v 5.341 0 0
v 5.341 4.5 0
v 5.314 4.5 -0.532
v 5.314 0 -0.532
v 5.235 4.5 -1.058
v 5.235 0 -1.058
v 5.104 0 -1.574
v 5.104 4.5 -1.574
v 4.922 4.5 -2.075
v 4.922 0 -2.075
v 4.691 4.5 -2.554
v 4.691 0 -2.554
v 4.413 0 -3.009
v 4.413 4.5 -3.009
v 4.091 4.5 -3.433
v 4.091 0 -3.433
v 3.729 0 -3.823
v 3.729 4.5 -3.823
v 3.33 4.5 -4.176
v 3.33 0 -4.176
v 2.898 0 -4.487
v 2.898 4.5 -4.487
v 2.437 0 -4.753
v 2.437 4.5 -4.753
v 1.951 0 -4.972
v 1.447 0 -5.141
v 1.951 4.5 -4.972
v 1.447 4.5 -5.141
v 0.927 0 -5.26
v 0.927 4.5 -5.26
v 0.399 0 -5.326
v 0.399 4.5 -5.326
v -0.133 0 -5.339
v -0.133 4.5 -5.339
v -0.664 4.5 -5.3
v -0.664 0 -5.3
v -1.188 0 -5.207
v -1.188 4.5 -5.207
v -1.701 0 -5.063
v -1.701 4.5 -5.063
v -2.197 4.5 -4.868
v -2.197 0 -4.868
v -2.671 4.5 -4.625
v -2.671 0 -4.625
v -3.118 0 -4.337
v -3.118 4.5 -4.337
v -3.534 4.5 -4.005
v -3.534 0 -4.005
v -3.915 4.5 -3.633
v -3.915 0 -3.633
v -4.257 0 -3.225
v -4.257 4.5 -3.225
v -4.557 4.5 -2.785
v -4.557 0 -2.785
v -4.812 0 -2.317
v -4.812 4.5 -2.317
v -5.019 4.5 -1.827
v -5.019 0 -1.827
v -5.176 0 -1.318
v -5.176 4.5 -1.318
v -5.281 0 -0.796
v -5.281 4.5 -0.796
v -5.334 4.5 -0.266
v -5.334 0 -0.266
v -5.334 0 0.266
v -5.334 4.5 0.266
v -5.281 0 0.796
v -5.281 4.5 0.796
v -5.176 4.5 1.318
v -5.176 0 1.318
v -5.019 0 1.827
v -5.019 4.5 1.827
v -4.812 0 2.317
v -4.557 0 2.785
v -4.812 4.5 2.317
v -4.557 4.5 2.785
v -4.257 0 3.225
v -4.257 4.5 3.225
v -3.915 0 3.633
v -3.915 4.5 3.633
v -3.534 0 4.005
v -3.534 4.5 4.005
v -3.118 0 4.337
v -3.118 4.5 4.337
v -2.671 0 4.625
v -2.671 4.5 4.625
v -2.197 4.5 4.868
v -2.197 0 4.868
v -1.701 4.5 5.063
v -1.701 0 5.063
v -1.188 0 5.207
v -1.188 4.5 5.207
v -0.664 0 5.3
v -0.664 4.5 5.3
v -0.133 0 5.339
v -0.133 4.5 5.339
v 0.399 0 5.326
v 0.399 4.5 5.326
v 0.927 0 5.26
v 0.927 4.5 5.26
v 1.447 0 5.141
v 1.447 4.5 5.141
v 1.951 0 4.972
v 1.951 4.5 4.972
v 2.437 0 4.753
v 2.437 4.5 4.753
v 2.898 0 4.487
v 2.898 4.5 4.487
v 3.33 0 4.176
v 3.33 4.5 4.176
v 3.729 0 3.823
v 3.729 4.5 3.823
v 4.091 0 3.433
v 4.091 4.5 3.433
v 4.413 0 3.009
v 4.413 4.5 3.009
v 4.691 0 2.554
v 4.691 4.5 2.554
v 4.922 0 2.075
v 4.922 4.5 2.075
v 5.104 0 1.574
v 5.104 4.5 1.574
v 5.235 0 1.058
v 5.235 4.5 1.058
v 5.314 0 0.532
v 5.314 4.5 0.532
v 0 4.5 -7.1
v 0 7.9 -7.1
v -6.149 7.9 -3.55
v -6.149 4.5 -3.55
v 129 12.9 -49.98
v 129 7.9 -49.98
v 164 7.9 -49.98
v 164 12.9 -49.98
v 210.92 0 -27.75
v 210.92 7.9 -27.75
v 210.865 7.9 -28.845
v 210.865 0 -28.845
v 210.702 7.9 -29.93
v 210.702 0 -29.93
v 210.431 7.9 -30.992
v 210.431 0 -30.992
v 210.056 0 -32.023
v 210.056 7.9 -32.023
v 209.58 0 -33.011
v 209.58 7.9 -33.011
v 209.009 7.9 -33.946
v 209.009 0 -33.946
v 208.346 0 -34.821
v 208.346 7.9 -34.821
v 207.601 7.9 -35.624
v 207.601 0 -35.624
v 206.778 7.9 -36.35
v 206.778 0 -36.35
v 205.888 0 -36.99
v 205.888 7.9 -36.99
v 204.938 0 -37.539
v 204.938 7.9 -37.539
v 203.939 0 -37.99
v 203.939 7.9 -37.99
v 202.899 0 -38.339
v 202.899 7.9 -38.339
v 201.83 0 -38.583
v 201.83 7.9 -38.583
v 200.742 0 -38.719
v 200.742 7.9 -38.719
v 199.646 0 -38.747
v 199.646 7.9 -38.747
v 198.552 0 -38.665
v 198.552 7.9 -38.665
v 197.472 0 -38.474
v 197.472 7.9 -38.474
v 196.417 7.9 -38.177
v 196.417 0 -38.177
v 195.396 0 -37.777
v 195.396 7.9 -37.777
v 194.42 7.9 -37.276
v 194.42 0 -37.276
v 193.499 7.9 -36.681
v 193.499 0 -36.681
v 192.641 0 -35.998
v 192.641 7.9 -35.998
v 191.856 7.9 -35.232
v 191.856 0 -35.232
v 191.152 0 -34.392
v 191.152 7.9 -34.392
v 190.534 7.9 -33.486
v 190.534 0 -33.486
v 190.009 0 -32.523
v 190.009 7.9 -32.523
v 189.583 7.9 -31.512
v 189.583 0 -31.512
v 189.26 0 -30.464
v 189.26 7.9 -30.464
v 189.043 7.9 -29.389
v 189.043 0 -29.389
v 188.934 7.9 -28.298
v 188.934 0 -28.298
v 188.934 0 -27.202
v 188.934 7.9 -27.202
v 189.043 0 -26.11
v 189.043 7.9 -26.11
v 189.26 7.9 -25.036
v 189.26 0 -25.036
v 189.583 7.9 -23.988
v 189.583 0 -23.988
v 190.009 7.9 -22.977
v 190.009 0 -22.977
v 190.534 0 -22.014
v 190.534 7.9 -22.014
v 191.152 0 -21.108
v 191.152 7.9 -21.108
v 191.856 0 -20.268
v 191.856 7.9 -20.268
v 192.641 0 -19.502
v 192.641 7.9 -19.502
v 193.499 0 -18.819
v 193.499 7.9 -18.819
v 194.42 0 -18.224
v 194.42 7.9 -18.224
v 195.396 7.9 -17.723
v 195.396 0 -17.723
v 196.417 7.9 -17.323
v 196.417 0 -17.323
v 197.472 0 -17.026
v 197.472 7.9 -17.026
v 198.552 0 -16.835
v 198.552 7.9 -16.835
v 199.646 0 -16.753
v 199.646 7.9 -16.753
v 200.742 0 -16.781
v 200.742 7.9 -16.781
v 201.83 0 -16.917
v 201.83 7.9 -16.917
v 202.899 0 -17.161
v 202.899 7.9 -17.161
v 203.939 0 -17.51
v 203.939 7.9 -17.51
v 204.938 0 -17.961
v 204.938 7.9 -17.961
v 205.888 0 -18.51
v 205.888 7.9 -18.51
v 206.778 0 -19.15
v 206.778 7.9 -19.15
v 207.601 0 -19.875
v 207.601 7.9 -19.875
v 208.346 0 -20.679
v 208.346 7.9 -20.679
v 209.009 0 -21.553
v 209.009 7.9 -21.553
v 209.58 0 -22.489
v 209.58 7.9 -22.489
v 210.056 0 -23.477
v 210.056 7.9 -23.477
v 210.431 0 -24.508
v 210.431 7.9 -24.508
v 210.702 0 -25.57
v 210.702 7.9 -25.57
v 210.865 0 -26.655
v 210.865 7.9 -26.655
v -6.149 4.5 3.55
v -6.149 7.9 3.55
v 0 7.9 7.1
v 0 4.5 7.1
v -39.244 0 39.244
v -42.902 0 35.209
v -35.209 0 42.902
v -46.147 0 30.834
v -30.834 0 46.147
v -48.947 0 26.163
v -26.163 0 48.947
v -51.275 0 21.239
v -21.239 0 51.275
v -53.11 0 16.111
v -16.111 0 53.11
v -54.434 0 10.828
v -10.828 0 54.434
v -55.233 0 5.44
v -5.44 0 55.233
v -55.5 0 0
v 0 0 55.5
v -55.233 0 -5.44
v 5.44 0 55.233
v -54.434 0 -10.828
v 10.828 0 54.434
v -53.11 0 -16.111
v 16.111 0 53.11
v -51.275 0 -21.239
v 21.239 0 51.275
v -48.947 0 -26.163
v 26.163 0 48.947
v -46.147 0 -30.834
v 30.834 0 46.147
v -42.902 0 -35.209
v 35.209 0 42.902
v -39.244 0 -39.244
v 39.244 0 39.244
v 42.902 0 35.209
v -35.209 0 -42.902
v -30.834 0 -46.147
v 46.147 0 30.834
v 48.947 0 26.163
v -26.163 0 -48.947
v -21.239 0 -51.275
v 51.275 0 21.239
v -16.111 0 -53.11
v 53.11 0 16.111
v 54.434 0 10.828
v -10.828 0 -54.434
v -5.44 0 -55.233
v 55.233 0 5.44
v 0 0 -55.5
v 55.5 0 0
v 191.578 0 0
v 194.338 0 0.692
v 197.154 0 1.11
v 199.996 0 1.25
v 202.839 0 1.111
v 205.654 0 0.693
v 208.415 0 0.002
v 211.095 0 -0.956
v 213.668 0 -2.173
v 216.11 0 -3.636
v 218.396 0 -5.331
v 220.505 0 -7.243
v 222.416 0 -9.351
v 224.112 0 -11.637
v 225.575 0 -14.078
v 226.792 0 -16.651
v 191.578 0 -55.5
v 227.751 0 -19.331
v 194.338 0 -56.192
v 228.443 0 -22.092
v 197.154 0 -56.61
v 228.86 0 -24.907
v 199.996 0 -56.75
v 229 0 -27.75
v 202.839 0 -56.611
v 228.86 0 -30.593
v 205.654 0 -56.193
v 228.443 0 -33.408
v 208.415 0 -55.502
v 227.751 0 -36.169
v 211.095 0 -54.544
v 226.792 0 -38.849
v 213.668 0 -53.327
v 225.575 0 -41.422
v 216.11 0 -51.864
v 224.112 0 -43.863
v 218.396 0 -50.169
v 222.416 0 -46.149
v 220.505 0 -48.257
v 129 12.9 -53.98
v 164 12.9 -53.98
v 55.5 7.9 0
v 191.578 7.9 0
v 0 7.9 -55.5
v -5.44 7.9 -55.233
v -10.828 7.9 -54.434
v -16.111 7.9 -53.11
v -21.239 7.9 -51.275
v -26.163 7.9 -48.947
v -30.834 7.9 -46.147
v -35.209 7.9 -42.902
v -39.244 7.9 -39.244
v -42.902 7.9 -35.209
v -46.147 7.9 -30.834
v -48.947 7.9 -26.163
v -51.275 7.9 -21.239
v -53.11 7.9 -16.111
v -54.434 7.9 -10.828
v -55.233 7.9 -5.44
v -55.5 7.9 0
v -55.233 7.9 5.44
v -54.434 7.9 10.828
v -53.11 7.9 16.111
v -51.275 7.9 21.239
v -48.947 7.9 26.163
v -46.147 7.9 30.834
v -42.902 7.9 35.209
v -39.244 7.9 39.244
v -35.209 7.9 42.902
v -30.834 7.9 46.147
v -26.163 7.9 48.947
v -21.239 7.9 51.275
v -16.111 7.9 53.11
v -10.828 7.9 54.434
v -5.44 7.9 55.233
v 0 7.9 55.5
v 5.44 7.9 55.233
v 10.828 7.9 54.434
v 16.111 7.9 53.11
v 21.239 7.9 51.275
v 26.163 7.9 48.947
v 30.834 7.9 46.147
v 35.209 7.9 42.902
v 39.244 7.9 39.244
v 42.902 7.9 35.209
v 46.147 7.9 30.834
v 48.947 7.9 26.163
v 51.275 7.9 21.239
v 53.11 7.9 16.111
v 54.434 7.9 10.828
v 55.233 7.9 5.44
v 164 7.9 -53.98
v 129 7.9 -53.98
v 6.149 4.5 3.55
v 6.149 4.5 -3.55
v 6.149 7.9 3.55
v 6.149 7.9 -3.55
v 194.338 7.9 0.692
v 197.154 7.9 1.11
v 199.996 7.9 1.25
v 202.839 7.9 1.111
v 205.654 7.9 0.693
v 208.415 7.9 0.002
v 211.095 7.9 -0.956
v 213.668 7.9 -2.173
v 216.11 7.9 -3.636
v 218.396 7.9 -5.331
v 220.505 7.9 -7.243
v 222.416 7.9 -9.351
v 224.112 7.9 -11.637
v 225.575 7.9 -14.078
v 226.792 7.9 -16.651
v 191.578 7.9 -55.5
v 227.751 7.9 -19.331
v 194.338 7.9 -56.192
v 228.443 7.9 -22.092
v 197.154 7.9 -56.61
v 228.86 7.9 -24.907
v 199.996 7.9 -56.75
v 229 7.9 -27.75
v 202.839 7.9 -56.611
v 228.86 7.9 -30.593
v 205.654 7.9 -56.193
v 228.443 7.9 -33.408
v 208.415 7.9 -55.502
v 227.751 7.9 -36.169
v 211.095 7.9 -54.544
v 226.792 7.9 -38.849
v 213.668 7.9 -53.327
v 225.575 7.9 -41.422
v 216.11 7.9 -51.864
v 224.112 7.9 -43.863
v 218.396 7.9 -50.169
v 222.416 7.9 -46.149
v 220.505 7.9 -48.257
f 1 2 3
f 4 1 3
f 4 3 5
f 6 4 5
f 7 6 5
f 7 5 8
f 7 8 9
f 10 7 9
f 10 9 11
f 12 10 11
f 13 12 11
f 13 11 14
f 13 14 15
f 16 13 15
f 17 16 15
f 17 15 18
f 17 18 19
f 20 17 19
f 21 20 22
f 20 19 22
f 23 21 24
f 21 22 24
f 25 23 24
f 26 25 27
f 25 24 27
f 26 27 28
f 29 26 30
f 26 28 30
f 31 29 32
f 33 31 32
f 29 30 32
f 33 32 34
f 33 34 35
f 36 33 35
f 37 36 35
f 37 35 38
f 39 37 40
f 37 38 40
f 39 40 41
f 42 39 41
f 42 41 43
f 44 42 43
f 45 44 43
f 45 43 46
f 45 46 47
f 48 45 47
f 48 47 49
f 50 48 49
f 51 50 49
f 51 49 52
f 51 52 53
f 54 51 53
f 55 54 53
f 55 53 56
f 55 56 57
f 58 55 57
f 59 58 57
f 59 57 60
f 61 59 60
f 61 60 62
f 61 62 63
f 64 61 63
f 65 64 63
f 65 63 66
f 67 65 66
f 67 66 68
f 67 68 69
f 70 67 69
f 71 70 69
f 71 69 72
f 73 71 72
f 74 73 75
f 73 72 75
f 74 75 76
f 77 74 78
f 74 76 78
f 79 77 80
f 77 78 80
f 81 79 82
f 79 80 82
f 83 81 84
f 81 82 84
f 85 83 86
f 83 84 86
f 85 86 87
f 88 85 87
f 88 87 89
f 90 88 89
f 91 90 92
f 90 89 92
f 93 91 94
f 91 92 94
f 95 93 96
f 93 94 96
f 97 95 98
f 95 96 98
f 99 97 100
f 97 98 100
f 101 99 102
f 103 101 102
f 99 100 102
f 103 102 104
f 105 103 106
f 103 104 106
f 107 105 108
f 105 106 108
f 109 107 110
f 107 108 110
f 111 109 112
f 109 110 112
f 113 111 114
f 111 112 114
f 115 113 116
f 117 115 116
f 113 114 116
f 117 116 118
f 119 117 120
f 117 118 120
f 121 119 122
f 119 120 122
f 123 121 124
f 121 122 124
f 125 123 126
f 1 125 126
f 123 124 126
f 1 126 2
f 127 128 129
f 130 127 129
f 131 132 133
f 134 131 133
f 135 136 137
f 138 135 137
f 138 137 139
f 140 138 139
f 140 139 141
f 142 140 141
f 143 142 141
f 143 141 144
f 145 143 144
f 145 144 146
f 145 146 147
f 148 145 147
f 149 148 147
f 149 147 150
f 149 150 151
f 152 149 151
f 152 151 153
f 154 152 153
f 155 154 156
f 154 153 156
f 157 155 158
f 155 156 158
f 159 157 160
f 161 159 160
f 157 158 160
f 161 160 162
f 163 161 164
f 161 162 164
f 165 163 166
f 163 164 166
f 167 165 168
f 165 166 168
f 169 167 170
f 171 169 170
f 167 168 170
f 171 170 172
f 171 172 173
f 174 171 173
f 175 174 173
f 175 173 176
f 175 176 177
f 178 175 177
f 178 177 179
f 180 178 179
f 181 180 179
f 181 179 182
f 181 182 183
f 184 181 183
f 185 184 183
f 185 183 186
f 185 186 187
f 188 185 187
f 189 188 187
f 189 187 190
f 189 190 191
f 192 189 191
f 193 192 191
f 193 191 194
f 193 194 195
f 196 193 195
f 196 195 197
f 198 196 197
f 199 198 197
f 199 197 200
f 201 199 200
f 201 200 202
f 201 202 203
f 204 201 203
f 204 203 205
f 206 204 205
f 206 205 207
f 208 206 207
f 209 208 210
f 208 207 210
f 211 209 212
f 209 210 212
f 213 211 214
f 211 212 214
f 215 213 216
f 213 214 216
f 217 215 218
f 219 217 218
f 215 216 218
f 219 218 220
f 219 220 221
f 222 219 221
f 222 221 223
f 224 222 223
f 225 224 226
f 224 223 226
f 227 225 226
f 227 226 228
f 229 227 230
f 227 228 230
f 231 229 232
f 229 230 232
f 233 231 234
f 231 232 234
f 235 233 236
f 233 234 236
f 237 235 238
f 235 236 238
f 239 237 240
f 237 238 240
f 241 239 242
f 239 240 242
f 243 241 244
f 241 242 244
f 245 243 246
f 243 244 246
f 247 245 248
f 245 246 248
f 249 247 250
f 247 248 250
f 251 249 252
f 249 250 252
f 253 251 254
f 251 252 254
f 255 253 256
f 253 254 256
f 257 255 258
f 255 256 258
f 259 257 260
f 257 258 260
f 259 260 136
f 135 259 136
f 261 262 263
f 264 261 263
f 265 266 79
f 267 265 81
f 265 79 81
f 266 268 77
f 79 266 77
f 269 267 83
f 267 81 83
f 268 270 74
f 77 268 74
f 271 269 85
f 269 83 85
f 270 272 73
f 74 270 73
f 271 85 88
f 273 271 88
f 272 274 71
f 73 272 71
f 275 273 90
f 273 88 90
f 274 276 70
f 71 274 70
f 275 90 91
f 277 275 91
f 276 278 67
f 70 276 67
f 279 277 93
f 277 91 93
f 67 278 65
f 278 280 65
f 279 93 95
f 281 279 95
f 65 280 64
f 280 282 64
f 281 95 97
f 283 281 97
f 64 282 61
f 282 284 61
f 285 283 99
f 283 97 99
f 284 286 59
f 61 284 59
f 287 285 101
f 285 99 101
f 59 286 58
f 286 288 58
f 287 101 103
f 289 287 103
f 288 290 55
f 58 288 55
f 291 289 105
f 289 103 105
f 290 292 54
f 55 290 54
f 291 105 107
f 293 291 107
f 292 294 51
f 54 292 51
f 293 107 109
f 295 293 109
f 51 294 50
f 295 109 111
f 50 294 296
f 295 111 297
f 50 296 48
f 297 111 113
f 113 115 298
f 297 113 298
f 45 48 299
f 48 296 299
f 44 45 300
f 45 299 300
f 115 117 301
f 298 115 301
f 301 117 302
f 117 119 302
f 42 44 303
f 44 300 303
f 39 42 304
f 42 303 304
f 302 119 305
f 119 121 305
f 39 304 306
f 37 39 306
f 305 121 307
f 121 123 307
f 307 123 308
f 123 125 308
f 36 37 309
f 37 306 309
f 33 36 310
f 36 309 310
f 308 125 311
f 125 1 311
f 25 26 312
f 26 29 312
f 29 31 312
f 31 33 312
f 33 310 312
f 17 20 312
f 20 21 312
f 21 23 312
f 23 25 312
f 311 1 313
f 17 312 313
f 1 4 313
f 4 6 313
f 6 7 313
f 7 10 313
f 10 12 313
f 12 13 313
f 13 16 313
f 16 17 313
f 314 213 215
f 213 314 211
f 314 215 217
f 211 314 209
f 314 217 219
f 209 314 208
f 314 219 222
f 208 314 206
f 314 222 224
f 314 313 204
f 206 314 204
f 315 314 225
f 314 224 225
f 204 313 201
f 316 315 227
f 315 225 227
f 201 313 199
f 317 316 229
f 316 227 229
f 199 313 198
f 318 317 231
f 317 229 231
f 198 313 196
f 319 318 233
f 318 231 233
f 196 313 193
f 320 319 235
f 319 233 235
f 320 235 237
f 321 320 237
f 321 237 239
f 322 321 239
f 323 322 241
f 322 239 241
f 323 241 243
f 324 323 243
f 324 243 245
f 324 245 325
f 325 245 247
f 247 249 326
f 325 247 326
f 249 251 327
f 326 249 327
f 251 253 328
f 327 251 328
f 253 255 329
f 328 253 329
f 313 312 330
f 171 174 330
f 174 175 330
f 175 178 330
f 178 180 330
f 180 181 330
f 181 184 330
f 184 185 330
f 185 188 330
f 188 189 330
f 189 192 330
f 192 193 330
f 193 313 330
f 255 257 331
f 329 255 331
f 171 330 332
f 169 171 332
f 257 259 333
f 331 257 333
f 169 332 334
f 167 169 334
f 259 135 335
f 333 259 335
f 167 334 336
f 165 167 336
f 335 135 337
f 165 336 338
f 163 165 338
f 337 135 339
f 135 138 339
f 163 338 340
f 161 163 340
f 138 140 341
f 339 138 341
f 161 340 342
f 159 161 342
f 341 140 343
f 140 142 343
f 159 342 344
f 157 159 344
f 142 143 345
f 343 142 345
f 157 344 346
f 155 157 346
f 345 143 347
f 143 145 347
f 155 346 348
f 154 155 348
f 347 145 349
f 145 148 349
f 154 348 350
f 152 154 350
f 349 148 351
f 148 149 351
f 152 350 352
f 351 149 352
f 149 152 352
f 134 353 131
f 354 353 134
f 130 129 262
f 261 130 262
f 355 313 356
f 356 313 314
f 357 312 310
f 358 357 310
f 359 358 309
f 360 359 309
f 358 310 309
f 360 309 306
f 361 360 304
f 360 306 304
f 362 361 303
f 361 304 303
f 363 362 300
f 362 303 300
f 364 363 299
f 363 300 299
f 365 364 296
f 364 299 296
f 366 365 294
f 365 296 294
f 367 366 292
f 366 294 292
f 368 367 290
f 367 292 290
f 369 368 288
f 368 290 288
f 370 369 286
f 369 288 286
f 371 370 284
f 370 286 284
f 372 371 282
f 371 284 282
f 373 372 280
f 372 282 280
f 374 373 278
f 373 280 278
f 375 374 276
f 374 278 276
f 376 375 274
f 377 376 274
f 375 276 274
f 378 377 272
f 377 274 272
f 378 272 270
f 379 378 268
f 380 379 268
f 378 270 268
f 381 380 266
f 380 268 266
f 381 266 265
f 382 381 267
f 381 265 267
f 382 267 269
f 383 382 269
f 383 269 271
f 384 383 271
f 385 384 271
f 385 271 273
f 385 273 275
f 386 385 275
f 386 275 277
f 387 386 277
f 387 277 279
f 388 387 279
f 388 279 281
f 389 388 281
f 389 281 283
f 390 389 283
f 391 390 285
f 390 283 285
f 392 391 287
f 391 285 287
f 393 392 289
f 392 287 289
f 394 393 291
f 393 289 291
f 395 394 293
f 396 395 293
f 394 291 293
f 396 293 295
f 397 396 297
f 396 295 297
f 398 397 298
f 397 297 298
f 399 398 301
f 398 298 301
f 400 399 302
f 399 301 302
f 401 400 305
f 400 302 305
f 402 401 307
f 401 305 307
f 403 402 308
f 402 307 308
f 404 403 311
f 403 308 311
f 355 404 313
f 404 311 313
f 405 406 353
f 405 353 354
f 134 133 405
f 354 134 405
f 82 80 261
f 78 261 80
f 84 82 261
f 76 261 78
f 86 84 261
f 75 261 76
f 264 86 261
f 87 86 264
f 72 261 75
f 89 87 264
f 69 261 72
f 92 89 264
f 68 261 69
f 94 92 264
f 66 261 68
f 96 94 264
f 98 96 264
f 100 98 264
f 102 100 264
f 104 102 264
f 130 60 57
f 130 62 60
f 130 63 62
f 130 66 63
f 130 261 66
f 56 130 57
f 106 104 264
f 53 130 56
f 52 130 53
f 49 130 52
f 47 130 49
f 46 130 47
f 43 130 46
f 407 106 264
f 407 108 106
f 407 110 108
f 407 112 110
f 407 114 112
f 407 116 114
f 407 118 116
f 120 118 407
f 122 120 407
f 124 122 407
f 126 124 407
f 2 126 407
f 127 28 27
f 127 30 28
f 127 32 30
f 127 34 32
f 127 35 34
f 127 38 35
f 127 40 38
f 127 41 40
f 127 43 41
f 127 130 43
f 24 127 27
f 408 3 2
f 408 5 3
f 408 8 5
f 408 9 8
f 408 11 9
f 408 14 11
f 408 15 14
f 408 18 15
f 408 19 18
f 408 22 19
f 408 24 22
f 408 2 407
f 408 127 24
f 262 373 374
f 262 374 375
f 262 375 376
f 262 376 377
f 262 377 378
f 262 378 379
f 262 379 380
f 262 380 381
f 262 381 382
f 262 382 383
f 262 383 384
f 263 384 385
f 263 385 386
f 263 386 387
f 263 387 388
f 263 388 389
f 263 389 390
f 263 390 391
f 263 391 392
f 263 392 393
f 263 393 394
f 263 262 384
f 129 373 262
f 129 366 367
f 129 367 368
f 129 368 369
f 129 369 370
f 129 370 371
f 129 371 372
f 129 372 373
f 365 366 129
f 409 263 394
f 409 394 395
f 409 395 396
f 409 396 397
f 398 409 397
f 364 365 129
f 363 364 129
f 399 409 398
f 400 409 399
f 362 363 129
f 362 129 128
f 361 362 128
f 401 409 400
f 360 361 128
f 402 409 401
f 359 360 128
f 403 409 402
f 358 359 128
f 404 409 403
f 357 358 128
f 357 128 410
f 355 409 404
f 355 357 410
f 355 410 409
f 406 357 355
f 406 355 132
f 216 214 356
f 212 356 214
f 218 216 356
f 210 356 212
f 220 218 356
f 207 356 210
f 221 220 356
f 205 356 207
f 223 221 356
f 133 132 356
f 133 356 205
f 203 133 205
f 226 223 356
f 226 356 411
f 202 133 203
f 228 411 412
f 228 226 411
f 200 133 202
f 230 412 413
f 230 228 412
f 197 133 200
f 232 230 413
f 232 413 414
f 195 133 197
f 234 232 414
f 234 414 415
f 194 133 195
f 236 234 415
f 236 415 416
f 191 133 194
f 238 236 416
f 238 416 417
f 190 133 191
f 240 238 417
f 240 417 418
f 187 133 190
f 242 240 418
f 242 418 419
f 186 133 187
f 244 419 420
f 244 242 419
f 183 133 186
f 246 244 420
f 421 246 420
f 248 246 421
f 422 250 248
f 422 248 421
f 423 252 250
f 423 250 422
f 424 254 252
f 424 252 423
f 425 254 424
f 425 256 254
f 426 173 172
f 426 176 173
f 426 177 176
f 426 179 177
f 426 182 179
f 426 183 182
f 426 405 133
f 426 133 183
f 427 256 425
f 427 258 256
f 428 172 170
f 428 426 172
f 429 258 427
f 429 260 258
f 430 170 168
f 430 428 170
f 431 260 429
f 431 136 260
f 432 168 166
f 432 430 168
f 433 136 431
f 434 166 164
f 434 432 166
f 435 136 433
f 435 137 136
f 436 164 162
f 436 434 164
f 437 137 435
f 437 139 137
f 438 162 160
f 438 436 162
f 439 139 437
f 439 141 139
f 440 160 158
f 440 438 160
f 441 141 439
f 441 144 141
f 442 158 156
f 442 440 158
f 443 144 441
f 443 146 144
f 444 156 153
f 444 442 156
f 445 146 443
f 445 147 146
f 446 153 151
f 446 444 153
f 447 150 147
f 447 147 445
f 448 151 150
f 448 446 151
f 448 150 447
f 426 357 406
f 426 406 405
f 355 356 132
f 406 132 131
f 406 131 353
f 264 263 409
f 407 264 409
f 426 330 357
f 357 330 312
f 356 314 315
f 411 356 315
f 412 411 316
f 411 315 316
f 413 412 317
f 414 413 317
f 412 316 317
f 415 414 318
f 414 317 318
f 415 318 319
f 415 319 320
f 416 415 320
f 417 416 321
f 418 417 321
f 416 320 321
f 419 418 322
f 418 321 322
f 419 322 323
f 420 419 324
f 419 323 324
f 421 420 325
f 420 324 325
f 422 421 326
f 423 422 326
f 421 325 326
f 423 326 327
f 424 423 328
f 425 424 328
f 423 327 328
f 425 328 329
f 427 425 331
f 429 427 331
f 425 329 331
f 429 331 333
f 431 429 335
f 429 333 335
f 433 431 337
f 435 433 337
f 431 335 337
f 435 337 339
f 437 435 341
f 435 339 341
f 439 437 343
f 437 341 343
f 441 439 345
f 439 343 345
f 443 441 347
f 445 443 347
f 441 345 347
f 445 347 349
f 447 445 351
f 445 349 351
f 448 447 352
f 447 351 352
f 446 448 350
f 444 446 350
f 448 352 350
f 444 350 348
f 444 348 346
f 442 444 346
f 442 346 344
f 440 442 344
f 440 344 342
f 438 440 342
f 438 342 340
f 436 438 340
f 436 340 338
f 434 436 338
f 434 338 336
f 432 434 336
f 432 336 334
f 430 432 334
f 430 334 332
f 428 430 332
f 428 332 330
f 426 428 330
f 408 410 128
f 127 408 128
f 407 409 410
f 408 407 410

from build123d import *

# Parameters (mm, degrees)
EXTRUDE_1_DEPTH     = 7.9
SKETCH_20_W         = 35
SKETCH_20_H         = 4
EXTRUDE_10_DEPTH    = 5
SKETCH_21_R         = 11
CUT_EXTRUDE_2_DEPTH = 8.9
SKETCH_2_R          = 5.341015389
CUT_EXTRUDE_3_DEPTH = 10
CUT_EXTRUDE_4_DEPTH = 3.4


with BuildPart() as part:
    # Эскиз1 → Бобышка-Вытянуть1 (new body)
    with BuildSketch(Plane(origin=(0, 0, 0), x_dir=(1, 0, 0), z_dir=(0, 1, 0))):
        with BuildLine():
            Line((191.577559736, 55.5), (0, 55.5))
            ThreePointArc((0, 55.5), (-39.244426356, -39.244426356), (55.5, 0))
            Line((55.5, 0), (191.577559736, 0))
            ThreePointArc((191.577559736, 0), (229, 27.75), (191.577559736, 55.5))
        make_face()
    extrude(amount=EXTRUDE_1_DEPTH)

    # Эскиз20 → Бобышка-Вытянуть10 (add)
    with BuildSketch(Plane(origin=(0, 7.9, 0), x_dir=(1, 0, 0), z_dir=(0, 1, 0))):
        with Locations((146.5, 51.980071838)):
            Rectangle(SKETCH_20_W, SKETCH_20_H)
    extrude(amount=EXTRUDE_10_DEPTH)

    # Эскиз21 → Вырез-Вытянуть2 (cut, through all)
    with BuildSketch(Plane(origin=(0, 7.9, 0), x_dir=(1, 0, 0), z_dir=(0, 1, 0))):
        with Locations((199.92, 27.749938535)):
            Circle(SKETCH_21_R)
    extrude(amount=-CUT_EXTRUDE_2_DEPTH, mode=Mode.SUBTRACT)

    # Эскиз2 → Вырез-Вытянуть3 (cut)
    with BuildSketch(Plane(origin=(0, 7.9, 0), x_dir=(1, 0, 0), z_dir=(0, 1, 0))):
        Circle(SKETCH_2_R)
    extrude(amount=-CUT_EXTRUDE_3_DEPTH, mode=Mode.SUBTRACT)

    # Эскиз22 → Вырез-Вытянуть4 (cut)
    with BuildSketch(Plane(origin=(0, 7.9, 0), x_dir=(1, 0, 0), z_dir=(0, 1, 0))):
        Polygon((0, 7.1), (-6.148780367, 3.55), (-6.148780367, -3.55), (0, -7.1), (6.148780367, -3.55), (6.148780367, 3.55), align=None)
    extrude(amount=-CUT_EXTRUDE_4_DEPTH, mode=Mode.SUBTRACT)


solid = part.part
